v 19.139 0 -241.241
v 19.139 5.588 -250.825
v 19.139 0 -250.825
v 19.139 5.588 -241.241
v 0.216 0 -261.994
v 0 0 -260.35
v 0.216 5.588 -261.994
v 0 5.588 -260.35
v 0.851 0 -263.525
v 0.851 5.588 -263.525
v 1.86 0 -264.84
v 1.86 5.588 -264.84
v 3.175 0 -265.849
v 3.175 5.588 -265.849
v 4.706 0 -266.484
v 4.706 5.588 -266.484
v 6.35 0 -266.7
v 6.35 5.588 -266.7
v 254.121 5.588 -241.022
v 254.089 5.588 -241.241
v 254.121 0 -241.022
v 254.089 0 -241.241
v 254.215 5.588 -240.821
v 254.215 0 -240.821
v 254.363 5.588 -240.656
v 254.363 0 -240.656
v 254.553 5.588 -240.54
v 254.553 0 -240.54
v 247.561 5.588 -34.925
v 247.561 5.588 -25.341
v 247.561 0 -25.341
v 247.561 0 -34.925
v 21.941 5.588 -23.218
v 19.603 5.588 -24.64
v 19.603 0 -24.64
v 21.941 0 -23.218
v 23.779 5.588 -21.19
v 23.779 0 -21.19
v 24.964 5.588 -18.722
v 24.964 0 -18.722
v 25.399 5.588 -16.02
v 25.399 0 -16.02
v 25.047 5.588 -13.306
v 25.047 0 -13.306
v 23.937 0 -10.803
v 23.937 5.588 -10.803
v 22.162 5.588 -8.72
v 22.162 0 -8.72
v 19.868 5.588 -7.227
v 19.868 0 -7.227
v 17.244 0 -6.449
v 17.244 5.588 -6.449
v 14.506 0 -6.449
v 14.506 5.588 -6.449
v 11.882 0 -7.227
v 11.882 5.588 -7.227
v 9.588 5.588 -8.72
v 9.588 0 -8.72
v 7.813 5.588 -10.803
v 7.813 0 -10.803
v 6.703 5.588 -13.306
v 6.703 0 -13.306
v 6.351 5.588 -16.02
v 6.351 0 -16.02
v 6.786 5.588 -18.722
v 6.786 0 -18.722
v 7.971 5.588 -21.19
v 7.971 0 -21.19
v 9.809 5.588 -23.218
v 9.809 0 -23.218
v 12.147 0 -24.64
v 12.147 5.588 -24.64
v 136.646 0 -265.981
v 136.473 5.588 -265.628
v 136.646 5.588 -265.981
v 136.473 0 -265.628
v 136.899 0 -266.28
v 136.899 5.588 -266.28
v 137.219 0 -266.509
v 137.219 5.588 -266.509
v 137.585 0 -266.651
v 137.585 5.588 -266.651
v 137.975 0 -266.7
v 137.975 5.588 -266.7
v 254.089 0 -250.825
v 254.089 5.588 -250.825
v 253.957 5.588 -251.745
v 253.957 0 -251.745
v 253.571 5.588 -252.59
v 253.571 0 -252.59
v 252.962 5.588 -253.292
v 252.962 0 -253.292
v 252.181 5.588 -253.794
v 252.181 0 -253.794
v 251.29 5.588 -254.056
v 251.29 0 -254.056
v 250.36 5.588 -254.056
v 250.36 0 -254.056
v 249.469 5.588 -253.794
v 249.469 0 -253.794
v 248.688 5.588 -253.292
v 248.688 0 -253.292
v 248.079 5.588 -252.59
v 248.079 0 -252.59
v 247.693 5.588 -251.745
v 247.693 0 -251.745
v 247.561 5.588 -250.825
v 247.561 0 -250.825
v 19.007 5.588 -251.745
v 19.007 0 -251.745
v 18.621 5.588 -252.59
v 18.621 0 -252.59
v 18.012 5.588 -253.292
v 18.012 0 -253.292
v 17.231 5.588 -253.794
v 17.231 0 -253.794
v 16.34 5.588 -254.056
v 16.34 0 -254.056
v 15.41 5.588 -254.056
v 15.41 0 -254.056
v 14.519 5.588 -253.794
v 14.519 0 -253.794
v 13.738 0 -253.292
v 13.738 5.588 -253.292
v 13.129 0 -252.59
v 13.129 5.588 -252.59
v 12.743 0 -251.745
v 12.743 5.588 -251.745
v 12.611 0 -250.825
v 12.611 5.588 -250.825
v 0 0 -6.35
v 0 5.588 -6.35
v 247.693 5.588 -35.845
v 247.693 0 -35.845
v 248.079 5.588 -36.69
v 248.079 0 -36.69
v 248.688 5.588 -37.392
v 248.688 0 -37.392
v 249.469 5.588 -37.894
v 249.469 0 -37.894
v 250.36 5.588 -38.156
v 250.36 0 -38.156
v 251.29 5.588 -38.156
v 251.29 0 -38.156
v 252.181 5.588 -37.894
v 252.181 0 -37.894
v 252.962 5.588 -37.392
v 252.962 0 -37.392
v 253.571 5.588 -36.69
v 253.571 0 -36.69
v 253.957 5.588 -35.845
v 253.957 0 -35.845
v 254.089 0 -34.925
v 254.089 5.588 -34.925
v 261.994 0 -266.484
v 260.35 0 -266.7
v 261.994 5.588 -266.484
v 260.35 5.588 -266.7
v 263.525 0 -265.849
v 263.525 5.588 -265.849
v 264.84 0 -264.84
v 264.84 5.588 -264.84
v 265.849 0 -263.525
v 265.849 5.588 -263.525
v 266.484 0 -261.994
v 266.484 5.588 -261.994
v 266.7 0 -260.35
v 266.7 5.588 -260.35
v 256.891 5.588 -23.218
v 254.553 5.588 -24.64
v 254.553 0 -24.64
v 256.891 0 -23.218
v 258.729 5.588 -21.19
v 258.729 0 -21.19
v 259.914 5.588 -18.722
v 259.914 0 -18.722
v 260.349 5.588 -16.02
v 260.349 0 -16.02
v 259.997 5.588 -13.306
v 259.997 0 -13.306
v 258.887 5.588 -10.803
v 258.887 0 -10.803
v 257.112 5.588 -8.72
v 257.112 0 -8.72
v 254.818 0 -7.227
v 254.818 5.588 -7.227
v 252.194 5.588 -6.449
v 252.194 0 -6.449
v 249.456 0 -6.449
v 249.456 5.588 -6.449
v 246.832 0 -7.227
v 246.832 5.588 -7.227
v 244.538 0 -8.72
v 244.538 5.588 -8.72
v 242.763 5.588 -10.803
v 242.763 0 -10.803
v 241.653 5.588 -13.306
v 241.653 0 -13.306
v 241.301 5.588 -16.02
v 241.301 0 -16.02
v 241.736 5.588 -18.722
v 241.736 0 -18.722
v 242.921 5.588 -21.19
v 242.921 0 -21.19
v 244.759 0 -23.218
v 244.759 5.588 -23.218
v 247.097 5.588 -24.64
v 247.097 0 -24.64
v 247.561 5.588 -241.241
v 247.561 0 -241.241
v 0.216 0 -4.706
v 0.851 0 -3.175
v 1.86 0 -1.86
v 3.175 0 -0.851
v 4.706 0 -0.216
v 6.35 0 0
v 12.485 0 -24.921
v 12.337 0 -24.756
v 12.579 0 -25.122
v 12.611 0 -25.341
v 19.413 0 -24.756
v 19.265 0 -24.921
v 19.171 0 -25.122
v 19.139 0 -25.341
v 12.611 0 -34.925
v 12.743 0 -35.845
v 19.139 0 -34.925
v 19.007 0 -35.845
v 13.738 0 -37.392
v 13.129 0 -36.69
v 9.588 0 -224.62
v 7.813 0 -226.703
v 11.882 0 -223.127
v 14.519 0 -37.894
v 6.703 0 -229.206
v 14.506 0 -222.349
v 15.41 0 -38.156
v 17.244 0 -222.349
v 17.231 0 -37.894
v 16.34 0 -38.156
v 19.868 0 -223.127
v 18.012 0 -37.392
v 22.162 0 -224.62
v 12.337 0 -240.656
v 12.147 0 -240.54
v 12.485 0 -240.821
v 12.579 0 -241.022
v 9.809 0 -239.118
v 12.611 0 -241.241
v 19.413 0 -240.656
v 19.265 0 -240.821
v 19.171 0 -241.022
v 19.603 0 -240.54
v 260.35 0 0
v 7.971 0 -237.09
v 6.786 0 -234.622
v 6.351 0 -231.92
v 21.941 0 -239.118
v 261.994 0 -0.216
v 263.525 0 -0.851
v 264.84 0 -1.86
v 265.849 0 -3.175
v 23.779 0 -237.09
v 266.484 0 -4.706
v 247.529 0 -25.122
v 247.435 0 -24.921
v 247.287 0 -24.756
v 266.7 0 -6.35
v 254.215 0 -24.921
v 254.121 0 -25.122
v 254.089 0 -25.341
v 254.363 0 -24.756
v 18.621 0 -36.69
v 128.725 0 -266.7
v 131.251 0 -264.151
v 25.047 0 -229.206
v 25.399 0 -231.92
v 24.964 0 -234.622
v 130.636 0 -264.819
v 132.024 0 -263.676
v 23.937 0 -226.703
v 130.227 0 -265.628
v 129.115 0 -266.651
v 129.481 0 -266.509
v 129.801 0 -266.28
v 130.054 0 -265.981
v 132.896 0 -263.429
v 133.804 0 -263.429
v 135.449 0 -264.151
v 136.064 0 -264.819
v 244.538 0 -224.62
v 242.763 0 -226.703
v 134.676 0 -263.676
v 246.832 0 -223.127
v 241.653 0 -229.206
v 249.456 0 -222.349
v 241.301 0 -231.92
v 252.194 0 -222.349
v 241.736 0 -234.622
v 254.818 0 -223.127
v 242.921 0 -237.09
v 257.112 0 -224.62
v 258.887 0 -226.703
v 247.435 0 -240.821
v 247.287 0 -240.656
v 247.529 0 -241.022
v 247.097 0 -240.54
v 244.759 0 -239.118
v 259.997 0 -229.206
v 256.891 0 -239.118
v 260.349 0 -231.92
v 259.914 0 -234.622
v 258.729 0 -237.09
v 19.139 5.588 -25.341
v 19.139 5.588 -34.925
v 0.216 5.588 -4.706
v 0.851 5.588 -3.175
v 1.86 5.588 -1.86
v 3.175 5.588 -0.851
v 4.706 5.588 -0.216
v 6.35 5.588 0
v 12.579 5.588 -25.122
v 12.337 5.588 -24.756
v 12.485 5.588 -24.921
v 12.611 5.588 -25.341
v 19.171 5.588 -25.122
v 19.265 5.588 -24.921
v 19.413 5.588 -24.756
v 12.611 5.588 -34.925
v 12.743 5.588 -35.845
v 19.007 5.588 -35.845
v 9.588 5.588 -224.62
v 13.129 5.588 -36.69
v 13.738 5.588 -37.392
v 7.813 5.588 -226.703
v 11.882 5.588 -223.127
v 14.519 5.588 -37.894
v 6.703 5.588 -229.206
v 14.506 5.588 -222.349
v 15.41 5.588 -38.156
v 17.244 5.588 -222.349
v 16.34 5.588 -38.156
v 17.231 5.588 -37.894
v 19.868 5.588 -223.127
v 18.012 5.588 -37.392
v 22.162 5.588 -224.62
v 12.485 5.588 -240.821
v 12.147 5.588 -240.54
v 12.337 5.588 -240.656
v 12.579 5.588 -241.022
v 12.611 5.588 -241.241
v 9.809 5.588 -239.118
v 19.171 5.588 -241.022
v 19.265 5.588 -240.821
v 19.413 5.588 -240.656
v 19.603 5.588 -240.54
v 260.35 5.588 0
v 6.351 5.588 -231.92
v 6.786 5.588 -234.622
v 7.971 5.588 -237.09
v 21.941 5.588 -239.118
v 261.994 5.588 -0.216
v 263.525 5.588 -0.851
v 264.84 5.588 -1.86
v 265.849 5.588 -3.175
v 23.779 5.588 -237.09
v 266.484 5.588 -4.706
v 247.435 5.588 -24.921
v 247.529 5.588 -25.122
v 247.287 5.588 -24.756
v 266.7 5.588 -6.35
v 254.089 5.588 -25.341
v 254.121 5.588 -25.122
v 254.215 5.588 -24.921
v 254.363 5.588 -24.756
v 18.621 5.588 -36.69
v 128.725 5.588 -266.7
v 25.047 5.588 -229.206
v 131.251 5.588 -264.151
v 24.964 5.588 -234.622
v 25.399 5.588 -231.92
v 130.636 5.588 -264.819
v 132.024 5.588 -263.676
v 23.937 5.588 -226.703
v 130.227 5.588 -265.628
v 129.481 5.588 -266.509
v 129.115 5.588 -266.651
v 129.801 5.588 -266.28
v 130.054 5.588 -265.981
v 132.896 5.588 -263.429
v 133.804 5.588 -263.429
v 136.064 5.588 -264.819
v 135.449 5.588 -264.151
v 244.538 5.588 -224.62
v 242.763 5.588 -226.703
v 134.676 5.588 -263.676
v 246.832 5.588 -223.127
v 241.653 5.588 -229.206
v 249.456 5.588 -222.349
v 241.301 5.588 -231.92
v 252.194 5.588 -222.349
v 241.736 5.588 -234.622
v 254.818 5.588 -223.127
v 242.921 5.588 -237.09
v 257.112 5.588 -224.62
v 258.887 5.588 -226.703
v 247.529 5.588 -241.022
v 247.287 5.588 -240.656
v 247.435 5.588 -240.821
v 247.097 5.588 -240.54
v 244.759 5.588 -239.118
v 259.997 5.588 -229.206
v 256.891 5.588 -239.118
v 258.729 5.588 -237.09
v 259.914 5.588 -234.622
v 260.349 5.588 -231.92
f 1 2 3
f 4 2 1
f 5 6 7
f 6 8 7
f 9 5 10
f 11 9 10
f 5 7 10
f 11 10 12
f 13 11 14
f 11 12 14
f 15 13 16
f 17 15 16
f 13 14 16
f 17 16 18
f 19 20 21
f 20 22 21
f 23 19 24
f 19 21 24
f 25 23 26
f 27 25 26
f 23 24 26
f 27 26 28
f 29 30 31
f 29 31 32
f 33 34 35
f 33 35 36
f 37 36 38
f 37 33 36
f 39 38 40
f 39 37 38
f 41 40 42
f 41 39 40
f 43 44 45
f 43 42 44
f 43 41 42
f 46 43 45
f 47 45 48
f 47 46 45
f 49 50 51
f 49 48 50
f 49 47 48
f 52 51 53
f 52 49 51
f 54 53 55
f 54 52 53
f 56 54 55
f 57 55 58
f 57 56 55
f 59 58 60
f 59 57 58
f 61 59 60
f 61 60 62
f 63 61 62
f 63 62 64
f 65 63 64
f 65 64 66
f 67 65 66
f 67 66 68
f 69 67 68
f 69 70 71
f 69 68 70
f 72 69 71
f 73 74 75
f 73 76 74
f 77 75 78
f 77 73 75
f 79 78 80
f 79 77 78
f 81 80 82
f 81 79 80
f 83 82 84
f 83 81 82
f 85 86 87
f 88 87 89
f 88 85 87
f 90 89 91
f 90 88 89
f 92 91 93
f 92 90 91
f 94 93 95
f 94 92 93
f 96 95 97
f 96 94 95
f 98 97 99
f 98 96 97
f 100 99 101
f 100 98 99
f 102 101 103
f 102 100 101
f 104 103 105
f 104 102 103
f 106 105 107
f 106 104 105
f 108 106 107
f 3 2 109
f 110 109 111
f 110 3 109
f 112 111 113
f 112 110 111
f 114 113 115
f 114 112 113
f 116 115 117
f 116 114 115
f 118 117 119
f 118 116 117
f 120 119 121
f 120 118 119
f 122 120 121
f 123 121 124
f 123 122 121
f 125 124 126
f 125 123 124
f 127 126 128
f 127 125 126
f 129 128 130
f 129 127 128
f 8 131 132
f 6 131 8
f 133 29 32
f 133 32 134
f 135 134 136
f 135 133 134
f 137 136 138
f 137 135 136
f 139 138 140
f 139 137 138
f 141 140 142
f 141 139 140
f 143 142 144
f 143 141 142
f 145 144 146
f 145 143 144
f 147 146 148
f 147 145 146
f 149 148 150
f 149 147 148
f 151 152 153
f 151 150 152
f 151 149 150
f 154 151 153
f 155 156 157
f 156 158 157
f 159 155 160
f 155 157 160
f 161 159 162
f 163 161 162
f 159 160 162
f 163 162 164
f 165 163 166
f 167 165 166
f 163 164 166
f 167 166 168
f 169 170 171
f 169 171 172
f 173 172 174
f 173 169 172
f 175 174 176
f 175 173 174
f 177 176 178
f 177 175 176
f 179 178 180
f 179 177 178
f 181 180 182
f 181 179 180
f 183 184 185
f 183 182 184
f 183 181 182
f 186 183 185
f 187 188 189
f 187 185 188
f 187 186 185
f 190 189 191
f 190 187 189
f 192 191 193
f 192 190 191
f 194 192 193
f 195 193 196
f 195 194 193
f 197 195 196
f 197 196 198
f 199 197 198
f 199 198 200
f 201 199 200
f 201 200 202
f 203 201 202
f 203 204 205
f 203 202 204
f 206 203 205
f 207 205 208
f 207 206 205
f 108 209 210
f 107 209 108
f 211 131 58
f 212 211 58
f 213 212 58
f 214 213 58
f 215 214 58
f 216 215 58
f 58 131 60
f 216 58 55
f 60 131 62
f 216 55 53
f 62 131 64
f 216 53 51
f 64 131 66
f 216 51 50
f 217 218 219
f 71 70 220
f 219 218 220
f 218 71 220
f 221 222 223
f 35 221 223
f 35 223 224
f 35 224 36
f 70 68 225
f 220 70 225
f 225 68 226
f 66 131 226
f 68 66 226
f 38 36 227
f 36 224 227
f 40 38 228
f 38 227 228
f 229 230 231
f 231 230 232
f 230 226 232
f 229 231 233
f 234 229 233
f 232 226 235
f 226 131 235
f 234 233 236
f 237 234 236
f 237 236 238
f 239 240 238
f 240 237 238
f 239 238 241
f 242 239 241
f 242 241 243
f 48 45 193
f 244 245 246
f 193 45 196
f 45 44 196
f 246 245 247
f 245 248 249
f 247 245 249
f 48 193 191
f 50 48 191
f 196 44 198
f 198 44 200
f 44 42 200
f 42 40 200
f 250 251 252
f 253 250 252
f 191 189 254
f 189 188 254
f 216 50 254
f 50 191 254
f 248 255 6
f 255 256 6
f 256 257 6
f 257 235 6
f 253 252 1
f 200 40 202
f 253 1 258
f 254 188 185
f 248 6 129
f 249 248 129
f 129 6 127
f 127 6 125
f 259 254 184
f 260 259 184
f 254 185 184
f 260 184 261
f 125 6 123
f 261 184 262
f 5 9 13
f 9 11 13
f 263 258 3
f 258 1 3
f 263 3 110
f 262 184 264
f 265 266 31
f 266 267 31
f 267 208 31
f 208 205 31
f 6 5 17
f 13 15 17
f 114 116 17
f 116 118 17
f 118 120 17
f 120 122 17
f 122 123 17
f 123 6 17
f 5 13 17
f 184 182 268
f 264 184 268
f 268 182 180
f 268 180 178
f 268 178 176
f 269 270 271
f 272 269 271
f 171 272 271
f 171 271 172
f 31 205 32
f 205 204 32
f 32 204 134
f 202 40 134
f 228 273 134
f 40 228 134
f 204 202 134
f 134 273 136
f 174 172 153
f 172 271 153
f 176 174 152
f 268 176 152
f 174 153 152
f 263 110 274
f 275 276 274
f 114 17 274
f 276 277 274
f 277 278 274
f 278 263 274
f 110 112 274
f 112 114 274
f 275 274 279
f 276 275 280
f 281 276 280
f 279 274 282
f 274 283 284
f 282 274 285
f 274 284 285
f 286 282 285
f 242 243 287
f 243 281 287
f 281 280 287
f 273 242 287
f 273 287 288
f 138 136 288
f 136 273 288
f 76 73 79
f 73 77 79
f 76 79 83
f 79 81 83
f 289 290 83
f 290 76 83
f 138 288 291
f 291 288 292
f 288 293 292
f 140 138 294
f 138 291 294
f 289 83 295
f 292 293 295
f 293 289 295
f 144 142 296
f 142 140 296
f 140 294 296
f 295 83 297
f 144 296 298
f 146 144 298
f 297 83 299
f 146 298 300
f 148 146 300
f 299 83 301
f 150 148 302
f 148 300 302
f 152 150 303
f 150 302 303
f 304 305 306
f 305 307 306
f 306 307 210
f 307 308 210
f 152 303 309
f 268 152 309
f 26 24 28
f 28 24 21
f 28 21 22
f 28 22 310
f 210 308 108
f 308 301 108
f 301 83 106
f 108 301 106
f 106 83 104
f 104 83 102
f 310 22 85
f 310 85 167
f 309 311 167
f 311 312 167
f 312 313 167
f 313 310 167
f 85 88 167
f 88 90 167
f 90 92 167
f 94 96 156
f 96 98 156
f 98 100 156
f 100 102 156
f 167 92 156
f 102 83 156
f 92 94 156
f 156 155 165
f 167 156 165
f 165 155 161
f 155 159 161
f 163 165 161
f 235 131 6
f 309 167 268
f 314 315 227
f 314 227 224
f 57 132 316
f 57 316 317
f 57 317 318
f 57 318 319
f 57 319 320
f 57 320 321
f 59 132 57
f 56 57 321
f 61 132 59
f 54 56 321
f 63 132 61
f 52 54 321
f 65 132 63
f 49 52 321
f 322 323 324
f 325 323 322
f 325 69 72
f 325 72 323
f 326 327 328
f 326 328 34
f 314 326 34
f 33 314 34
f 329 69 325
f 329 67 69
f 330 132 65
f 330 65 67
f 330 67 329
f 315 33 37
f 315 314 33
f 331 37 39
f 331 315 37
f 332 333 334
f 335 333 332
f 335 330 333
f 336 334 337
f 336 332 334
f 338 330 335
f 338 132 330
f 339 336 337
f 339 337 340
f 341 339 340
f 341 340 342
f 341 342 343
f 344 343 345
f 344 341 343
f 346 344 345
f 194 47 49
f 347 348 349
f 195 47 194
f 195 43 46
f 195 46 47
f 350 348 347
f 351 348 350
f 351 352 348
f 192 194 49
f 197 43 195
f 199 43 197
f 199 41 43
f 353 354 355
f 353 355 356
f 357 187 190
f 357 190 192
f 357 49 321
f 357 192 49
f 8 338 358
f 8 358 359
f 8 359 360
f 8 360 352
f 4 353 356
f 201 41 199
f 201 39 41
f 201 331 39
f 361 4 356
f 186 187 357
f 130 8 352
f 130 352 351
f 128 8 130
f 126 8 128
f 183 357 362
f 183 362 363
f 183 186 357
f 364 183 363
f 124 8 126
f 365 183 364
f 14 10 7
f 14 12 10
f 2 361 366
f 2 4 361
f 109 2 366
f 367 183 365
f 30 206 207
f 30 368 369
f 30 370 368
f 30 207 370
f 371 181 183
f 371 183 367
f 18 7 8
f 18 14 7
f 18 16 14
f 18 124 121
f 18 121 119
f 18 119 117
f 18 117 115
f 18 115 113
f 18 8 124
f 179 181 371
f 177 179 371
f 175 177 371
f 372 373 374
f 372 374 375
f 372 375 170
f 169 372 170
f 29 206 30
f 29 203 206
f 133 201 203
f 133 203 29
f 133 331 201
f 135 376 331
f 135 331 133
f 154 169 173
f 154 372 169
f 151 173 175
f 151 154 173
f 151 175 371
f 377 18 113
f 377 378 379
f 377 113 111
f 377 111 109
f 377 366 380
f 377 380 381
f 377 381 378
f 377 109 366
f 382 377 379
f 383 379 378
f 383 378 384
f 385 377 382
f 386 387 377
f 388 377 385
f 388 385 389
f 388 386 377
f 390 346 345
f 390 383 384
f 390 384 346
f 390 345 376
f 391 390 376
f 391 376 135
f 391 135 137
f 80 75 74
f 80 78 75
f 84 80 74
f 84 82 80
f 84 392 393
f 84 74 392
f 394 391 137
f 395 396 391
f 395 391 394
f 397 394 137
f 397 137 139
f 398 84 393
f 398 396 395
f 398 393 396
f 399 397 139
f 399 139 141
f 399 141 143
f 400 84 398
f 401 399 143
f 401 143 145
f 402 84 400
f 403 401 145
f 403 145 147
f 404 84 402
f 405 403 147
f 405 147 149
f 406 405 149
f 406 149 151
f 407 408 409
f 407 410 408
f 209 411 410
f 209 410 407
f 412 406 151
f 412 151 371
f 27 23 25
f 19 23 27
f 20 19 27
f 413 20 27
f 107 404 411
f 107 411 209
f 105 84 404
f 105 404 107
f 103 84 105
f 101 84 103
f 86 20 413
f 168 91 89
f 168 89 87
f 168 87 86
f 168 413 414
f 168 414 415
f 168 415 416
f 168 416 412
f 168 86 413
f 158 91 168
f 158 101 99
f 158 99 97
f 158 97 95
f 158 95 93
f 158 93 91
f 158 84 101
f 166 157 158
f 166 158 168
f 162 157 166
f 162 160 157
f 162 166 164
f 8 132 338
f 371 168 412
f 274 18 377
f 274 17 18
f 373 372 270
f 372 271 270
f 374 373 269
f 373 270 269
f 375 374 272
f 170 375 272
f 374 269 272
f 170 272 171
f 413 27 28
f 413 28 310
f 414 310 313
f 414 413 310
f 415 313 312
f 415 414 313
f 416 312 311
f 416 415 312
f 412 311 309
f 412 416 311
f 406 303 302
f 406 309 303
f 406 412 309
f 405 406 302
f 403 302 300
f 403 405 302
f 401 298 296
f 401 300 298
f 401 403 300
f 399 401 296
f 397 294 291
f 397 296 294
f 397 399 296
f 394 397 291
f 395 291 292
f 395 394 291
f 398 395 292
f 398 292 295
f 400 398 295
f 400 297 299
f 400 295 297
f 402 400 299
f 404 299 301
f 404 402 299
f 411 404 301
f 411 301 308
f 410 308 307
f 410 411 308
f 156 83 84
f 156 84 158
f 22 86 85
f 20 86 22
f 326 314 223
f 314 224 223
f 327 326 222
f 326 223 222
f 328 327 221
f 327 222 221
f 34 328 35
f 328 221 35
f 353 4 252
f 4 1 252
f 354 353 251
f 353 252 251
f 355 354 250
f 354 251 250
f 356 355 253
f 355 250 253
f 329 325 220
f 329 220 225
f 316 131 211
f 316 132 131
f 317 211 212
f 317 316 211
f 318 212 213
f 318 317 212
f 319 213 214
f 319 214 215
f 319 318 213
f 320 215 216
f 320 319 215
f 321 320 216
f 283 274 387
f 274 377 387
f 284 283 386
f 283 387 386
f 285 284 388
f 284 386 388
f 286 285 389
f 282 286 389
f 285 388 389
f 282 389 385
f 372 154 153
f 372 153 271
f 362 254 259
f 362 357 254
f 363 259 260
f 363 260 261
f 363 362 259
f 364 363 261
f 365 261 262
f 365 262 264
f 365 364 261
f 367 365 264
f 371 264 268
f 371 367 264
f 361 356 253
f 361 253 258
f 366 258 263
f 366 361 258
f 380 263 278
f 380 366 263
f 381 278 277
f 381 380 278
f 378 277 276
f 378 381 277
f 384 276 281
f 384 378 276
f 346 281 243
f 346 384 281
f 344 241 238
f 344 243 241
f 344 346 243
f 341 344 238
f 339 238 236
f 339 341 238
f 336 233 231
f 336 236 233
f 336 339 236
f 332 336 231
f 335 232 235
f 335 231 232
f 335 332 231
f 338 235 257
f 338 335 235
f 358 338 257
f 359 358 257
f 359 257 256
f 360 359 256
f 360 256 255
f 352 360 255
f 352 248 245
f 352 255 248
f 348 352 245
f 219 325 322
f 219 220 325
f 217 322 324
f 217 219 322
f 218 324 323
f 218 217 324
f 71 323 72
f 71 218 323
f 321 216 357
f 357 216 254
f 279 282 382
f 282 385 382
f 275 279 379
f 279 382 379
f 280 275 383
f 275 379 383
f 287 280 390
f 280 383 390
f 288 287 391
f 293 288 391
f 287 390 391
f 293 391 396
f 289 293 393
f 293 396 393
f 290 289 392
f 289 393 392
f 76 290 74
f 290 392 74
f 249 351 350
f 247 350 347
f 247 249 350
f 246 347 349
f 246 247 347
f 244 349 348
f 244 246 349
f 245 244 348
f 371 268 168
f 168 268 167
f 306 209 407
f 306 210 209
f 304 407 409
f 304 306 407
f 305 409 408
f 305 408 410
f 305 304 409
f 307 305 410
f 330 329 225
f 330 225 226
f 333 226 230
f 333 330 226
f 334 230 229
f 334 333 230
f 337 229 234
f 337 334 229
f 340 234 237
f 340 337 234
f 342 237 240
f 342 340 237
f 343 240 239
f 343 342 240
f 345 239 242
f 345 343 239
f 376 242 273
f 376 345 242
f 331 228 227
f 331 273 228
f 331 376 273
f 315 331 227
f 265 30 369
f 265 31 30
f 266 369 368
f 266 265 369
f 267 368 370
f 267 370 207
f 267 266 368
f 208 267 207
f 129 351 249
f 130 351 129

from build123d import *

# Parameters (mm, degrees)
SKETCH1_W           = 266.7
SKETCH1_H           = 266.7
SKETCH1_R           = 3.2639
BOSS_EXTRUDE1_DEPTH = 5.588
FILLET1_R           = 6.35
CUT_EXTRUDE2_DEPTH  = 378.212149518
SKETCH6_R           = 3.302
CUT_EXTRUDE3_DEPTH  = 378.212149518
FILLET2_R           = 1.5875
FILLET3_R           = 0.762


with BuildPart() as part:
    # Sketch1 → Boss-Extrude1 (new body)
    with BuildSketch(Plane(origin=(0, 0, 0), x_dir=(1, 0, 0), z_dir=(0, 1, 0))):
        with Locations((133.35, 133.35)):
            Rectangle(SKETCH1_W, SKETCH1_H)
        with Locations(Location((15.875, 250.825, 0), (0, 0, 270))):
            Circle(SKETCH1_R, mode=Mode.SUBTRACT)
        with Locations(Location((250.825, 250.825, 0), (0, 0, 270))):
            Circle(SKETCH1_R, mode=Mode.SUBTRACT)
        with Locations(Location((15.875, 15.875, 0), (0, 0, 270))):
            Circle(SKETCH1_R, mode=Mode.SUBTRACT)
        with Locations(Location((250.825, 15.875, 0), (0, 0, 270))):
            Circle(SKETCH1_R, mode=Mode.SUBTRACT)
    extrude(amount=BOSS_EXTRUDE1_DEPTH)

    # Fillet1
    fillet1_edges = [part.edges().sort_by_distance(p)[0] for p in [
        (0, 2.794, -266.7),
        (266.7, 2.794, -266.7),
        (266.7, 2.794, 0),
        (0, 2.794, 0),
    ]]
    fillet(fillet1_edges, radius=FILLET1_R)

    # Sketch5 → Cut-Extrude2 (cut, through all)
    with BuildSketch(Plane(origin=(0, 5.588, 0), x_dir=(1, 0, 0), z_dir=(0, 1, 0))):
        with BuildLine():
            Line((19.1389, 34.925), (19.1389, 24.823328436))
            ThreePointArc((19.1389, 24.823328436), (15.875, 6.35), (12.6111, 24.823328436))
            Line((12.6111, 24.823328436), (12.6111, 34.925))
            ThreePointArc((12.6111, 34.925), (15.875, 38.1889), (19.1389, 34.925))
        make_face()
        with BuildLine():
            Line((254.0889, 34.925), (254.0889, 24.823328436))
            ThreePointArc((254.0889, 24.823328436), (250.825, 6.35), (247.5611, 24.823328436))
            Line((247.5611, 24.823328436), (247.5611, 34.925))
            ThreePointArc((247.5611, 34.925), (250.825, 38.1889), (254.0889, 34.925))
        make_face()
        with BuildLine():
            Line((19.1389, 250.825), (19.1389, 240.723328436))
            ThreePointArc((19.1389, 240.723328436), (15.875, 222.25), (12.6111, 240.723328436))
            Line((12.6111, 240.723328436), (12.6111, 250.825))
            ThreePointArc((12.6111, 250.825), (15.875, 254.0889), (19.1389, 250.825))
        make_face()
        with BuildLine():
            Line((254.0889, 250.825), (254.0889, 240.723328436))
            ThreePointArc((254.0889, 240.723328436), (250.825, 222.25), (247.5611, 240.723328436))
            Line((247.5611, 240.723328436), (247.5611, 250.825))
            ThreePointArc((247.5611, 250.825), (250.825, 254.0889), (254.0889, 250.825))
        make_face()
    extrude(amount=-CUT_EXTRUDE2_DEPTH, mode=Mode.SUBTRACT)

    # Sketch6 → Cut-Extrude3 (cut, through all)
    with BuildSketch(Plane(origin=(0, 5.588, 0), x_dir=(1, 0, 0), z_dir=(0, 1, 0))):
        with Locations((133.35, 266.7)):
            Circle(SKETCH6_R)
    extrude(amount=-CUT_EXTRUDE3_DEPTH, mode=Mode.SUBTRACT)

    # Fillet2
    fillet2_edges = [part.edges().sort_by_distance(p)[0] for p in [
        (130.048, 2.794, -266.7),
        (136.652, 2.794, -266.7),
    ]]
    fillet(fillet2_edges, radius=FILLET2_R)

    # Fillet3
    fillet3_edges = [part.edges().sort_by_distance(p)[0] for p in [
        (254.0889, 2.794, -24.823328436),
        (247.5611, 2.794, -24.823328436),
        (19.1389, 2.794, -240.723328436),
        (12.6111, 2.794, -240.723328436),
        (254.0889, 2.794, -240.723328436),
        (247.5611, 2.794, -240.723328436),
        (19.1389, 2.794, -24.823328436),
        (12.6111, 2.794, -24.823328436),
    ]]
    fillet(fillet3_edges, radius=FILLET3_R)


solid = part.part
